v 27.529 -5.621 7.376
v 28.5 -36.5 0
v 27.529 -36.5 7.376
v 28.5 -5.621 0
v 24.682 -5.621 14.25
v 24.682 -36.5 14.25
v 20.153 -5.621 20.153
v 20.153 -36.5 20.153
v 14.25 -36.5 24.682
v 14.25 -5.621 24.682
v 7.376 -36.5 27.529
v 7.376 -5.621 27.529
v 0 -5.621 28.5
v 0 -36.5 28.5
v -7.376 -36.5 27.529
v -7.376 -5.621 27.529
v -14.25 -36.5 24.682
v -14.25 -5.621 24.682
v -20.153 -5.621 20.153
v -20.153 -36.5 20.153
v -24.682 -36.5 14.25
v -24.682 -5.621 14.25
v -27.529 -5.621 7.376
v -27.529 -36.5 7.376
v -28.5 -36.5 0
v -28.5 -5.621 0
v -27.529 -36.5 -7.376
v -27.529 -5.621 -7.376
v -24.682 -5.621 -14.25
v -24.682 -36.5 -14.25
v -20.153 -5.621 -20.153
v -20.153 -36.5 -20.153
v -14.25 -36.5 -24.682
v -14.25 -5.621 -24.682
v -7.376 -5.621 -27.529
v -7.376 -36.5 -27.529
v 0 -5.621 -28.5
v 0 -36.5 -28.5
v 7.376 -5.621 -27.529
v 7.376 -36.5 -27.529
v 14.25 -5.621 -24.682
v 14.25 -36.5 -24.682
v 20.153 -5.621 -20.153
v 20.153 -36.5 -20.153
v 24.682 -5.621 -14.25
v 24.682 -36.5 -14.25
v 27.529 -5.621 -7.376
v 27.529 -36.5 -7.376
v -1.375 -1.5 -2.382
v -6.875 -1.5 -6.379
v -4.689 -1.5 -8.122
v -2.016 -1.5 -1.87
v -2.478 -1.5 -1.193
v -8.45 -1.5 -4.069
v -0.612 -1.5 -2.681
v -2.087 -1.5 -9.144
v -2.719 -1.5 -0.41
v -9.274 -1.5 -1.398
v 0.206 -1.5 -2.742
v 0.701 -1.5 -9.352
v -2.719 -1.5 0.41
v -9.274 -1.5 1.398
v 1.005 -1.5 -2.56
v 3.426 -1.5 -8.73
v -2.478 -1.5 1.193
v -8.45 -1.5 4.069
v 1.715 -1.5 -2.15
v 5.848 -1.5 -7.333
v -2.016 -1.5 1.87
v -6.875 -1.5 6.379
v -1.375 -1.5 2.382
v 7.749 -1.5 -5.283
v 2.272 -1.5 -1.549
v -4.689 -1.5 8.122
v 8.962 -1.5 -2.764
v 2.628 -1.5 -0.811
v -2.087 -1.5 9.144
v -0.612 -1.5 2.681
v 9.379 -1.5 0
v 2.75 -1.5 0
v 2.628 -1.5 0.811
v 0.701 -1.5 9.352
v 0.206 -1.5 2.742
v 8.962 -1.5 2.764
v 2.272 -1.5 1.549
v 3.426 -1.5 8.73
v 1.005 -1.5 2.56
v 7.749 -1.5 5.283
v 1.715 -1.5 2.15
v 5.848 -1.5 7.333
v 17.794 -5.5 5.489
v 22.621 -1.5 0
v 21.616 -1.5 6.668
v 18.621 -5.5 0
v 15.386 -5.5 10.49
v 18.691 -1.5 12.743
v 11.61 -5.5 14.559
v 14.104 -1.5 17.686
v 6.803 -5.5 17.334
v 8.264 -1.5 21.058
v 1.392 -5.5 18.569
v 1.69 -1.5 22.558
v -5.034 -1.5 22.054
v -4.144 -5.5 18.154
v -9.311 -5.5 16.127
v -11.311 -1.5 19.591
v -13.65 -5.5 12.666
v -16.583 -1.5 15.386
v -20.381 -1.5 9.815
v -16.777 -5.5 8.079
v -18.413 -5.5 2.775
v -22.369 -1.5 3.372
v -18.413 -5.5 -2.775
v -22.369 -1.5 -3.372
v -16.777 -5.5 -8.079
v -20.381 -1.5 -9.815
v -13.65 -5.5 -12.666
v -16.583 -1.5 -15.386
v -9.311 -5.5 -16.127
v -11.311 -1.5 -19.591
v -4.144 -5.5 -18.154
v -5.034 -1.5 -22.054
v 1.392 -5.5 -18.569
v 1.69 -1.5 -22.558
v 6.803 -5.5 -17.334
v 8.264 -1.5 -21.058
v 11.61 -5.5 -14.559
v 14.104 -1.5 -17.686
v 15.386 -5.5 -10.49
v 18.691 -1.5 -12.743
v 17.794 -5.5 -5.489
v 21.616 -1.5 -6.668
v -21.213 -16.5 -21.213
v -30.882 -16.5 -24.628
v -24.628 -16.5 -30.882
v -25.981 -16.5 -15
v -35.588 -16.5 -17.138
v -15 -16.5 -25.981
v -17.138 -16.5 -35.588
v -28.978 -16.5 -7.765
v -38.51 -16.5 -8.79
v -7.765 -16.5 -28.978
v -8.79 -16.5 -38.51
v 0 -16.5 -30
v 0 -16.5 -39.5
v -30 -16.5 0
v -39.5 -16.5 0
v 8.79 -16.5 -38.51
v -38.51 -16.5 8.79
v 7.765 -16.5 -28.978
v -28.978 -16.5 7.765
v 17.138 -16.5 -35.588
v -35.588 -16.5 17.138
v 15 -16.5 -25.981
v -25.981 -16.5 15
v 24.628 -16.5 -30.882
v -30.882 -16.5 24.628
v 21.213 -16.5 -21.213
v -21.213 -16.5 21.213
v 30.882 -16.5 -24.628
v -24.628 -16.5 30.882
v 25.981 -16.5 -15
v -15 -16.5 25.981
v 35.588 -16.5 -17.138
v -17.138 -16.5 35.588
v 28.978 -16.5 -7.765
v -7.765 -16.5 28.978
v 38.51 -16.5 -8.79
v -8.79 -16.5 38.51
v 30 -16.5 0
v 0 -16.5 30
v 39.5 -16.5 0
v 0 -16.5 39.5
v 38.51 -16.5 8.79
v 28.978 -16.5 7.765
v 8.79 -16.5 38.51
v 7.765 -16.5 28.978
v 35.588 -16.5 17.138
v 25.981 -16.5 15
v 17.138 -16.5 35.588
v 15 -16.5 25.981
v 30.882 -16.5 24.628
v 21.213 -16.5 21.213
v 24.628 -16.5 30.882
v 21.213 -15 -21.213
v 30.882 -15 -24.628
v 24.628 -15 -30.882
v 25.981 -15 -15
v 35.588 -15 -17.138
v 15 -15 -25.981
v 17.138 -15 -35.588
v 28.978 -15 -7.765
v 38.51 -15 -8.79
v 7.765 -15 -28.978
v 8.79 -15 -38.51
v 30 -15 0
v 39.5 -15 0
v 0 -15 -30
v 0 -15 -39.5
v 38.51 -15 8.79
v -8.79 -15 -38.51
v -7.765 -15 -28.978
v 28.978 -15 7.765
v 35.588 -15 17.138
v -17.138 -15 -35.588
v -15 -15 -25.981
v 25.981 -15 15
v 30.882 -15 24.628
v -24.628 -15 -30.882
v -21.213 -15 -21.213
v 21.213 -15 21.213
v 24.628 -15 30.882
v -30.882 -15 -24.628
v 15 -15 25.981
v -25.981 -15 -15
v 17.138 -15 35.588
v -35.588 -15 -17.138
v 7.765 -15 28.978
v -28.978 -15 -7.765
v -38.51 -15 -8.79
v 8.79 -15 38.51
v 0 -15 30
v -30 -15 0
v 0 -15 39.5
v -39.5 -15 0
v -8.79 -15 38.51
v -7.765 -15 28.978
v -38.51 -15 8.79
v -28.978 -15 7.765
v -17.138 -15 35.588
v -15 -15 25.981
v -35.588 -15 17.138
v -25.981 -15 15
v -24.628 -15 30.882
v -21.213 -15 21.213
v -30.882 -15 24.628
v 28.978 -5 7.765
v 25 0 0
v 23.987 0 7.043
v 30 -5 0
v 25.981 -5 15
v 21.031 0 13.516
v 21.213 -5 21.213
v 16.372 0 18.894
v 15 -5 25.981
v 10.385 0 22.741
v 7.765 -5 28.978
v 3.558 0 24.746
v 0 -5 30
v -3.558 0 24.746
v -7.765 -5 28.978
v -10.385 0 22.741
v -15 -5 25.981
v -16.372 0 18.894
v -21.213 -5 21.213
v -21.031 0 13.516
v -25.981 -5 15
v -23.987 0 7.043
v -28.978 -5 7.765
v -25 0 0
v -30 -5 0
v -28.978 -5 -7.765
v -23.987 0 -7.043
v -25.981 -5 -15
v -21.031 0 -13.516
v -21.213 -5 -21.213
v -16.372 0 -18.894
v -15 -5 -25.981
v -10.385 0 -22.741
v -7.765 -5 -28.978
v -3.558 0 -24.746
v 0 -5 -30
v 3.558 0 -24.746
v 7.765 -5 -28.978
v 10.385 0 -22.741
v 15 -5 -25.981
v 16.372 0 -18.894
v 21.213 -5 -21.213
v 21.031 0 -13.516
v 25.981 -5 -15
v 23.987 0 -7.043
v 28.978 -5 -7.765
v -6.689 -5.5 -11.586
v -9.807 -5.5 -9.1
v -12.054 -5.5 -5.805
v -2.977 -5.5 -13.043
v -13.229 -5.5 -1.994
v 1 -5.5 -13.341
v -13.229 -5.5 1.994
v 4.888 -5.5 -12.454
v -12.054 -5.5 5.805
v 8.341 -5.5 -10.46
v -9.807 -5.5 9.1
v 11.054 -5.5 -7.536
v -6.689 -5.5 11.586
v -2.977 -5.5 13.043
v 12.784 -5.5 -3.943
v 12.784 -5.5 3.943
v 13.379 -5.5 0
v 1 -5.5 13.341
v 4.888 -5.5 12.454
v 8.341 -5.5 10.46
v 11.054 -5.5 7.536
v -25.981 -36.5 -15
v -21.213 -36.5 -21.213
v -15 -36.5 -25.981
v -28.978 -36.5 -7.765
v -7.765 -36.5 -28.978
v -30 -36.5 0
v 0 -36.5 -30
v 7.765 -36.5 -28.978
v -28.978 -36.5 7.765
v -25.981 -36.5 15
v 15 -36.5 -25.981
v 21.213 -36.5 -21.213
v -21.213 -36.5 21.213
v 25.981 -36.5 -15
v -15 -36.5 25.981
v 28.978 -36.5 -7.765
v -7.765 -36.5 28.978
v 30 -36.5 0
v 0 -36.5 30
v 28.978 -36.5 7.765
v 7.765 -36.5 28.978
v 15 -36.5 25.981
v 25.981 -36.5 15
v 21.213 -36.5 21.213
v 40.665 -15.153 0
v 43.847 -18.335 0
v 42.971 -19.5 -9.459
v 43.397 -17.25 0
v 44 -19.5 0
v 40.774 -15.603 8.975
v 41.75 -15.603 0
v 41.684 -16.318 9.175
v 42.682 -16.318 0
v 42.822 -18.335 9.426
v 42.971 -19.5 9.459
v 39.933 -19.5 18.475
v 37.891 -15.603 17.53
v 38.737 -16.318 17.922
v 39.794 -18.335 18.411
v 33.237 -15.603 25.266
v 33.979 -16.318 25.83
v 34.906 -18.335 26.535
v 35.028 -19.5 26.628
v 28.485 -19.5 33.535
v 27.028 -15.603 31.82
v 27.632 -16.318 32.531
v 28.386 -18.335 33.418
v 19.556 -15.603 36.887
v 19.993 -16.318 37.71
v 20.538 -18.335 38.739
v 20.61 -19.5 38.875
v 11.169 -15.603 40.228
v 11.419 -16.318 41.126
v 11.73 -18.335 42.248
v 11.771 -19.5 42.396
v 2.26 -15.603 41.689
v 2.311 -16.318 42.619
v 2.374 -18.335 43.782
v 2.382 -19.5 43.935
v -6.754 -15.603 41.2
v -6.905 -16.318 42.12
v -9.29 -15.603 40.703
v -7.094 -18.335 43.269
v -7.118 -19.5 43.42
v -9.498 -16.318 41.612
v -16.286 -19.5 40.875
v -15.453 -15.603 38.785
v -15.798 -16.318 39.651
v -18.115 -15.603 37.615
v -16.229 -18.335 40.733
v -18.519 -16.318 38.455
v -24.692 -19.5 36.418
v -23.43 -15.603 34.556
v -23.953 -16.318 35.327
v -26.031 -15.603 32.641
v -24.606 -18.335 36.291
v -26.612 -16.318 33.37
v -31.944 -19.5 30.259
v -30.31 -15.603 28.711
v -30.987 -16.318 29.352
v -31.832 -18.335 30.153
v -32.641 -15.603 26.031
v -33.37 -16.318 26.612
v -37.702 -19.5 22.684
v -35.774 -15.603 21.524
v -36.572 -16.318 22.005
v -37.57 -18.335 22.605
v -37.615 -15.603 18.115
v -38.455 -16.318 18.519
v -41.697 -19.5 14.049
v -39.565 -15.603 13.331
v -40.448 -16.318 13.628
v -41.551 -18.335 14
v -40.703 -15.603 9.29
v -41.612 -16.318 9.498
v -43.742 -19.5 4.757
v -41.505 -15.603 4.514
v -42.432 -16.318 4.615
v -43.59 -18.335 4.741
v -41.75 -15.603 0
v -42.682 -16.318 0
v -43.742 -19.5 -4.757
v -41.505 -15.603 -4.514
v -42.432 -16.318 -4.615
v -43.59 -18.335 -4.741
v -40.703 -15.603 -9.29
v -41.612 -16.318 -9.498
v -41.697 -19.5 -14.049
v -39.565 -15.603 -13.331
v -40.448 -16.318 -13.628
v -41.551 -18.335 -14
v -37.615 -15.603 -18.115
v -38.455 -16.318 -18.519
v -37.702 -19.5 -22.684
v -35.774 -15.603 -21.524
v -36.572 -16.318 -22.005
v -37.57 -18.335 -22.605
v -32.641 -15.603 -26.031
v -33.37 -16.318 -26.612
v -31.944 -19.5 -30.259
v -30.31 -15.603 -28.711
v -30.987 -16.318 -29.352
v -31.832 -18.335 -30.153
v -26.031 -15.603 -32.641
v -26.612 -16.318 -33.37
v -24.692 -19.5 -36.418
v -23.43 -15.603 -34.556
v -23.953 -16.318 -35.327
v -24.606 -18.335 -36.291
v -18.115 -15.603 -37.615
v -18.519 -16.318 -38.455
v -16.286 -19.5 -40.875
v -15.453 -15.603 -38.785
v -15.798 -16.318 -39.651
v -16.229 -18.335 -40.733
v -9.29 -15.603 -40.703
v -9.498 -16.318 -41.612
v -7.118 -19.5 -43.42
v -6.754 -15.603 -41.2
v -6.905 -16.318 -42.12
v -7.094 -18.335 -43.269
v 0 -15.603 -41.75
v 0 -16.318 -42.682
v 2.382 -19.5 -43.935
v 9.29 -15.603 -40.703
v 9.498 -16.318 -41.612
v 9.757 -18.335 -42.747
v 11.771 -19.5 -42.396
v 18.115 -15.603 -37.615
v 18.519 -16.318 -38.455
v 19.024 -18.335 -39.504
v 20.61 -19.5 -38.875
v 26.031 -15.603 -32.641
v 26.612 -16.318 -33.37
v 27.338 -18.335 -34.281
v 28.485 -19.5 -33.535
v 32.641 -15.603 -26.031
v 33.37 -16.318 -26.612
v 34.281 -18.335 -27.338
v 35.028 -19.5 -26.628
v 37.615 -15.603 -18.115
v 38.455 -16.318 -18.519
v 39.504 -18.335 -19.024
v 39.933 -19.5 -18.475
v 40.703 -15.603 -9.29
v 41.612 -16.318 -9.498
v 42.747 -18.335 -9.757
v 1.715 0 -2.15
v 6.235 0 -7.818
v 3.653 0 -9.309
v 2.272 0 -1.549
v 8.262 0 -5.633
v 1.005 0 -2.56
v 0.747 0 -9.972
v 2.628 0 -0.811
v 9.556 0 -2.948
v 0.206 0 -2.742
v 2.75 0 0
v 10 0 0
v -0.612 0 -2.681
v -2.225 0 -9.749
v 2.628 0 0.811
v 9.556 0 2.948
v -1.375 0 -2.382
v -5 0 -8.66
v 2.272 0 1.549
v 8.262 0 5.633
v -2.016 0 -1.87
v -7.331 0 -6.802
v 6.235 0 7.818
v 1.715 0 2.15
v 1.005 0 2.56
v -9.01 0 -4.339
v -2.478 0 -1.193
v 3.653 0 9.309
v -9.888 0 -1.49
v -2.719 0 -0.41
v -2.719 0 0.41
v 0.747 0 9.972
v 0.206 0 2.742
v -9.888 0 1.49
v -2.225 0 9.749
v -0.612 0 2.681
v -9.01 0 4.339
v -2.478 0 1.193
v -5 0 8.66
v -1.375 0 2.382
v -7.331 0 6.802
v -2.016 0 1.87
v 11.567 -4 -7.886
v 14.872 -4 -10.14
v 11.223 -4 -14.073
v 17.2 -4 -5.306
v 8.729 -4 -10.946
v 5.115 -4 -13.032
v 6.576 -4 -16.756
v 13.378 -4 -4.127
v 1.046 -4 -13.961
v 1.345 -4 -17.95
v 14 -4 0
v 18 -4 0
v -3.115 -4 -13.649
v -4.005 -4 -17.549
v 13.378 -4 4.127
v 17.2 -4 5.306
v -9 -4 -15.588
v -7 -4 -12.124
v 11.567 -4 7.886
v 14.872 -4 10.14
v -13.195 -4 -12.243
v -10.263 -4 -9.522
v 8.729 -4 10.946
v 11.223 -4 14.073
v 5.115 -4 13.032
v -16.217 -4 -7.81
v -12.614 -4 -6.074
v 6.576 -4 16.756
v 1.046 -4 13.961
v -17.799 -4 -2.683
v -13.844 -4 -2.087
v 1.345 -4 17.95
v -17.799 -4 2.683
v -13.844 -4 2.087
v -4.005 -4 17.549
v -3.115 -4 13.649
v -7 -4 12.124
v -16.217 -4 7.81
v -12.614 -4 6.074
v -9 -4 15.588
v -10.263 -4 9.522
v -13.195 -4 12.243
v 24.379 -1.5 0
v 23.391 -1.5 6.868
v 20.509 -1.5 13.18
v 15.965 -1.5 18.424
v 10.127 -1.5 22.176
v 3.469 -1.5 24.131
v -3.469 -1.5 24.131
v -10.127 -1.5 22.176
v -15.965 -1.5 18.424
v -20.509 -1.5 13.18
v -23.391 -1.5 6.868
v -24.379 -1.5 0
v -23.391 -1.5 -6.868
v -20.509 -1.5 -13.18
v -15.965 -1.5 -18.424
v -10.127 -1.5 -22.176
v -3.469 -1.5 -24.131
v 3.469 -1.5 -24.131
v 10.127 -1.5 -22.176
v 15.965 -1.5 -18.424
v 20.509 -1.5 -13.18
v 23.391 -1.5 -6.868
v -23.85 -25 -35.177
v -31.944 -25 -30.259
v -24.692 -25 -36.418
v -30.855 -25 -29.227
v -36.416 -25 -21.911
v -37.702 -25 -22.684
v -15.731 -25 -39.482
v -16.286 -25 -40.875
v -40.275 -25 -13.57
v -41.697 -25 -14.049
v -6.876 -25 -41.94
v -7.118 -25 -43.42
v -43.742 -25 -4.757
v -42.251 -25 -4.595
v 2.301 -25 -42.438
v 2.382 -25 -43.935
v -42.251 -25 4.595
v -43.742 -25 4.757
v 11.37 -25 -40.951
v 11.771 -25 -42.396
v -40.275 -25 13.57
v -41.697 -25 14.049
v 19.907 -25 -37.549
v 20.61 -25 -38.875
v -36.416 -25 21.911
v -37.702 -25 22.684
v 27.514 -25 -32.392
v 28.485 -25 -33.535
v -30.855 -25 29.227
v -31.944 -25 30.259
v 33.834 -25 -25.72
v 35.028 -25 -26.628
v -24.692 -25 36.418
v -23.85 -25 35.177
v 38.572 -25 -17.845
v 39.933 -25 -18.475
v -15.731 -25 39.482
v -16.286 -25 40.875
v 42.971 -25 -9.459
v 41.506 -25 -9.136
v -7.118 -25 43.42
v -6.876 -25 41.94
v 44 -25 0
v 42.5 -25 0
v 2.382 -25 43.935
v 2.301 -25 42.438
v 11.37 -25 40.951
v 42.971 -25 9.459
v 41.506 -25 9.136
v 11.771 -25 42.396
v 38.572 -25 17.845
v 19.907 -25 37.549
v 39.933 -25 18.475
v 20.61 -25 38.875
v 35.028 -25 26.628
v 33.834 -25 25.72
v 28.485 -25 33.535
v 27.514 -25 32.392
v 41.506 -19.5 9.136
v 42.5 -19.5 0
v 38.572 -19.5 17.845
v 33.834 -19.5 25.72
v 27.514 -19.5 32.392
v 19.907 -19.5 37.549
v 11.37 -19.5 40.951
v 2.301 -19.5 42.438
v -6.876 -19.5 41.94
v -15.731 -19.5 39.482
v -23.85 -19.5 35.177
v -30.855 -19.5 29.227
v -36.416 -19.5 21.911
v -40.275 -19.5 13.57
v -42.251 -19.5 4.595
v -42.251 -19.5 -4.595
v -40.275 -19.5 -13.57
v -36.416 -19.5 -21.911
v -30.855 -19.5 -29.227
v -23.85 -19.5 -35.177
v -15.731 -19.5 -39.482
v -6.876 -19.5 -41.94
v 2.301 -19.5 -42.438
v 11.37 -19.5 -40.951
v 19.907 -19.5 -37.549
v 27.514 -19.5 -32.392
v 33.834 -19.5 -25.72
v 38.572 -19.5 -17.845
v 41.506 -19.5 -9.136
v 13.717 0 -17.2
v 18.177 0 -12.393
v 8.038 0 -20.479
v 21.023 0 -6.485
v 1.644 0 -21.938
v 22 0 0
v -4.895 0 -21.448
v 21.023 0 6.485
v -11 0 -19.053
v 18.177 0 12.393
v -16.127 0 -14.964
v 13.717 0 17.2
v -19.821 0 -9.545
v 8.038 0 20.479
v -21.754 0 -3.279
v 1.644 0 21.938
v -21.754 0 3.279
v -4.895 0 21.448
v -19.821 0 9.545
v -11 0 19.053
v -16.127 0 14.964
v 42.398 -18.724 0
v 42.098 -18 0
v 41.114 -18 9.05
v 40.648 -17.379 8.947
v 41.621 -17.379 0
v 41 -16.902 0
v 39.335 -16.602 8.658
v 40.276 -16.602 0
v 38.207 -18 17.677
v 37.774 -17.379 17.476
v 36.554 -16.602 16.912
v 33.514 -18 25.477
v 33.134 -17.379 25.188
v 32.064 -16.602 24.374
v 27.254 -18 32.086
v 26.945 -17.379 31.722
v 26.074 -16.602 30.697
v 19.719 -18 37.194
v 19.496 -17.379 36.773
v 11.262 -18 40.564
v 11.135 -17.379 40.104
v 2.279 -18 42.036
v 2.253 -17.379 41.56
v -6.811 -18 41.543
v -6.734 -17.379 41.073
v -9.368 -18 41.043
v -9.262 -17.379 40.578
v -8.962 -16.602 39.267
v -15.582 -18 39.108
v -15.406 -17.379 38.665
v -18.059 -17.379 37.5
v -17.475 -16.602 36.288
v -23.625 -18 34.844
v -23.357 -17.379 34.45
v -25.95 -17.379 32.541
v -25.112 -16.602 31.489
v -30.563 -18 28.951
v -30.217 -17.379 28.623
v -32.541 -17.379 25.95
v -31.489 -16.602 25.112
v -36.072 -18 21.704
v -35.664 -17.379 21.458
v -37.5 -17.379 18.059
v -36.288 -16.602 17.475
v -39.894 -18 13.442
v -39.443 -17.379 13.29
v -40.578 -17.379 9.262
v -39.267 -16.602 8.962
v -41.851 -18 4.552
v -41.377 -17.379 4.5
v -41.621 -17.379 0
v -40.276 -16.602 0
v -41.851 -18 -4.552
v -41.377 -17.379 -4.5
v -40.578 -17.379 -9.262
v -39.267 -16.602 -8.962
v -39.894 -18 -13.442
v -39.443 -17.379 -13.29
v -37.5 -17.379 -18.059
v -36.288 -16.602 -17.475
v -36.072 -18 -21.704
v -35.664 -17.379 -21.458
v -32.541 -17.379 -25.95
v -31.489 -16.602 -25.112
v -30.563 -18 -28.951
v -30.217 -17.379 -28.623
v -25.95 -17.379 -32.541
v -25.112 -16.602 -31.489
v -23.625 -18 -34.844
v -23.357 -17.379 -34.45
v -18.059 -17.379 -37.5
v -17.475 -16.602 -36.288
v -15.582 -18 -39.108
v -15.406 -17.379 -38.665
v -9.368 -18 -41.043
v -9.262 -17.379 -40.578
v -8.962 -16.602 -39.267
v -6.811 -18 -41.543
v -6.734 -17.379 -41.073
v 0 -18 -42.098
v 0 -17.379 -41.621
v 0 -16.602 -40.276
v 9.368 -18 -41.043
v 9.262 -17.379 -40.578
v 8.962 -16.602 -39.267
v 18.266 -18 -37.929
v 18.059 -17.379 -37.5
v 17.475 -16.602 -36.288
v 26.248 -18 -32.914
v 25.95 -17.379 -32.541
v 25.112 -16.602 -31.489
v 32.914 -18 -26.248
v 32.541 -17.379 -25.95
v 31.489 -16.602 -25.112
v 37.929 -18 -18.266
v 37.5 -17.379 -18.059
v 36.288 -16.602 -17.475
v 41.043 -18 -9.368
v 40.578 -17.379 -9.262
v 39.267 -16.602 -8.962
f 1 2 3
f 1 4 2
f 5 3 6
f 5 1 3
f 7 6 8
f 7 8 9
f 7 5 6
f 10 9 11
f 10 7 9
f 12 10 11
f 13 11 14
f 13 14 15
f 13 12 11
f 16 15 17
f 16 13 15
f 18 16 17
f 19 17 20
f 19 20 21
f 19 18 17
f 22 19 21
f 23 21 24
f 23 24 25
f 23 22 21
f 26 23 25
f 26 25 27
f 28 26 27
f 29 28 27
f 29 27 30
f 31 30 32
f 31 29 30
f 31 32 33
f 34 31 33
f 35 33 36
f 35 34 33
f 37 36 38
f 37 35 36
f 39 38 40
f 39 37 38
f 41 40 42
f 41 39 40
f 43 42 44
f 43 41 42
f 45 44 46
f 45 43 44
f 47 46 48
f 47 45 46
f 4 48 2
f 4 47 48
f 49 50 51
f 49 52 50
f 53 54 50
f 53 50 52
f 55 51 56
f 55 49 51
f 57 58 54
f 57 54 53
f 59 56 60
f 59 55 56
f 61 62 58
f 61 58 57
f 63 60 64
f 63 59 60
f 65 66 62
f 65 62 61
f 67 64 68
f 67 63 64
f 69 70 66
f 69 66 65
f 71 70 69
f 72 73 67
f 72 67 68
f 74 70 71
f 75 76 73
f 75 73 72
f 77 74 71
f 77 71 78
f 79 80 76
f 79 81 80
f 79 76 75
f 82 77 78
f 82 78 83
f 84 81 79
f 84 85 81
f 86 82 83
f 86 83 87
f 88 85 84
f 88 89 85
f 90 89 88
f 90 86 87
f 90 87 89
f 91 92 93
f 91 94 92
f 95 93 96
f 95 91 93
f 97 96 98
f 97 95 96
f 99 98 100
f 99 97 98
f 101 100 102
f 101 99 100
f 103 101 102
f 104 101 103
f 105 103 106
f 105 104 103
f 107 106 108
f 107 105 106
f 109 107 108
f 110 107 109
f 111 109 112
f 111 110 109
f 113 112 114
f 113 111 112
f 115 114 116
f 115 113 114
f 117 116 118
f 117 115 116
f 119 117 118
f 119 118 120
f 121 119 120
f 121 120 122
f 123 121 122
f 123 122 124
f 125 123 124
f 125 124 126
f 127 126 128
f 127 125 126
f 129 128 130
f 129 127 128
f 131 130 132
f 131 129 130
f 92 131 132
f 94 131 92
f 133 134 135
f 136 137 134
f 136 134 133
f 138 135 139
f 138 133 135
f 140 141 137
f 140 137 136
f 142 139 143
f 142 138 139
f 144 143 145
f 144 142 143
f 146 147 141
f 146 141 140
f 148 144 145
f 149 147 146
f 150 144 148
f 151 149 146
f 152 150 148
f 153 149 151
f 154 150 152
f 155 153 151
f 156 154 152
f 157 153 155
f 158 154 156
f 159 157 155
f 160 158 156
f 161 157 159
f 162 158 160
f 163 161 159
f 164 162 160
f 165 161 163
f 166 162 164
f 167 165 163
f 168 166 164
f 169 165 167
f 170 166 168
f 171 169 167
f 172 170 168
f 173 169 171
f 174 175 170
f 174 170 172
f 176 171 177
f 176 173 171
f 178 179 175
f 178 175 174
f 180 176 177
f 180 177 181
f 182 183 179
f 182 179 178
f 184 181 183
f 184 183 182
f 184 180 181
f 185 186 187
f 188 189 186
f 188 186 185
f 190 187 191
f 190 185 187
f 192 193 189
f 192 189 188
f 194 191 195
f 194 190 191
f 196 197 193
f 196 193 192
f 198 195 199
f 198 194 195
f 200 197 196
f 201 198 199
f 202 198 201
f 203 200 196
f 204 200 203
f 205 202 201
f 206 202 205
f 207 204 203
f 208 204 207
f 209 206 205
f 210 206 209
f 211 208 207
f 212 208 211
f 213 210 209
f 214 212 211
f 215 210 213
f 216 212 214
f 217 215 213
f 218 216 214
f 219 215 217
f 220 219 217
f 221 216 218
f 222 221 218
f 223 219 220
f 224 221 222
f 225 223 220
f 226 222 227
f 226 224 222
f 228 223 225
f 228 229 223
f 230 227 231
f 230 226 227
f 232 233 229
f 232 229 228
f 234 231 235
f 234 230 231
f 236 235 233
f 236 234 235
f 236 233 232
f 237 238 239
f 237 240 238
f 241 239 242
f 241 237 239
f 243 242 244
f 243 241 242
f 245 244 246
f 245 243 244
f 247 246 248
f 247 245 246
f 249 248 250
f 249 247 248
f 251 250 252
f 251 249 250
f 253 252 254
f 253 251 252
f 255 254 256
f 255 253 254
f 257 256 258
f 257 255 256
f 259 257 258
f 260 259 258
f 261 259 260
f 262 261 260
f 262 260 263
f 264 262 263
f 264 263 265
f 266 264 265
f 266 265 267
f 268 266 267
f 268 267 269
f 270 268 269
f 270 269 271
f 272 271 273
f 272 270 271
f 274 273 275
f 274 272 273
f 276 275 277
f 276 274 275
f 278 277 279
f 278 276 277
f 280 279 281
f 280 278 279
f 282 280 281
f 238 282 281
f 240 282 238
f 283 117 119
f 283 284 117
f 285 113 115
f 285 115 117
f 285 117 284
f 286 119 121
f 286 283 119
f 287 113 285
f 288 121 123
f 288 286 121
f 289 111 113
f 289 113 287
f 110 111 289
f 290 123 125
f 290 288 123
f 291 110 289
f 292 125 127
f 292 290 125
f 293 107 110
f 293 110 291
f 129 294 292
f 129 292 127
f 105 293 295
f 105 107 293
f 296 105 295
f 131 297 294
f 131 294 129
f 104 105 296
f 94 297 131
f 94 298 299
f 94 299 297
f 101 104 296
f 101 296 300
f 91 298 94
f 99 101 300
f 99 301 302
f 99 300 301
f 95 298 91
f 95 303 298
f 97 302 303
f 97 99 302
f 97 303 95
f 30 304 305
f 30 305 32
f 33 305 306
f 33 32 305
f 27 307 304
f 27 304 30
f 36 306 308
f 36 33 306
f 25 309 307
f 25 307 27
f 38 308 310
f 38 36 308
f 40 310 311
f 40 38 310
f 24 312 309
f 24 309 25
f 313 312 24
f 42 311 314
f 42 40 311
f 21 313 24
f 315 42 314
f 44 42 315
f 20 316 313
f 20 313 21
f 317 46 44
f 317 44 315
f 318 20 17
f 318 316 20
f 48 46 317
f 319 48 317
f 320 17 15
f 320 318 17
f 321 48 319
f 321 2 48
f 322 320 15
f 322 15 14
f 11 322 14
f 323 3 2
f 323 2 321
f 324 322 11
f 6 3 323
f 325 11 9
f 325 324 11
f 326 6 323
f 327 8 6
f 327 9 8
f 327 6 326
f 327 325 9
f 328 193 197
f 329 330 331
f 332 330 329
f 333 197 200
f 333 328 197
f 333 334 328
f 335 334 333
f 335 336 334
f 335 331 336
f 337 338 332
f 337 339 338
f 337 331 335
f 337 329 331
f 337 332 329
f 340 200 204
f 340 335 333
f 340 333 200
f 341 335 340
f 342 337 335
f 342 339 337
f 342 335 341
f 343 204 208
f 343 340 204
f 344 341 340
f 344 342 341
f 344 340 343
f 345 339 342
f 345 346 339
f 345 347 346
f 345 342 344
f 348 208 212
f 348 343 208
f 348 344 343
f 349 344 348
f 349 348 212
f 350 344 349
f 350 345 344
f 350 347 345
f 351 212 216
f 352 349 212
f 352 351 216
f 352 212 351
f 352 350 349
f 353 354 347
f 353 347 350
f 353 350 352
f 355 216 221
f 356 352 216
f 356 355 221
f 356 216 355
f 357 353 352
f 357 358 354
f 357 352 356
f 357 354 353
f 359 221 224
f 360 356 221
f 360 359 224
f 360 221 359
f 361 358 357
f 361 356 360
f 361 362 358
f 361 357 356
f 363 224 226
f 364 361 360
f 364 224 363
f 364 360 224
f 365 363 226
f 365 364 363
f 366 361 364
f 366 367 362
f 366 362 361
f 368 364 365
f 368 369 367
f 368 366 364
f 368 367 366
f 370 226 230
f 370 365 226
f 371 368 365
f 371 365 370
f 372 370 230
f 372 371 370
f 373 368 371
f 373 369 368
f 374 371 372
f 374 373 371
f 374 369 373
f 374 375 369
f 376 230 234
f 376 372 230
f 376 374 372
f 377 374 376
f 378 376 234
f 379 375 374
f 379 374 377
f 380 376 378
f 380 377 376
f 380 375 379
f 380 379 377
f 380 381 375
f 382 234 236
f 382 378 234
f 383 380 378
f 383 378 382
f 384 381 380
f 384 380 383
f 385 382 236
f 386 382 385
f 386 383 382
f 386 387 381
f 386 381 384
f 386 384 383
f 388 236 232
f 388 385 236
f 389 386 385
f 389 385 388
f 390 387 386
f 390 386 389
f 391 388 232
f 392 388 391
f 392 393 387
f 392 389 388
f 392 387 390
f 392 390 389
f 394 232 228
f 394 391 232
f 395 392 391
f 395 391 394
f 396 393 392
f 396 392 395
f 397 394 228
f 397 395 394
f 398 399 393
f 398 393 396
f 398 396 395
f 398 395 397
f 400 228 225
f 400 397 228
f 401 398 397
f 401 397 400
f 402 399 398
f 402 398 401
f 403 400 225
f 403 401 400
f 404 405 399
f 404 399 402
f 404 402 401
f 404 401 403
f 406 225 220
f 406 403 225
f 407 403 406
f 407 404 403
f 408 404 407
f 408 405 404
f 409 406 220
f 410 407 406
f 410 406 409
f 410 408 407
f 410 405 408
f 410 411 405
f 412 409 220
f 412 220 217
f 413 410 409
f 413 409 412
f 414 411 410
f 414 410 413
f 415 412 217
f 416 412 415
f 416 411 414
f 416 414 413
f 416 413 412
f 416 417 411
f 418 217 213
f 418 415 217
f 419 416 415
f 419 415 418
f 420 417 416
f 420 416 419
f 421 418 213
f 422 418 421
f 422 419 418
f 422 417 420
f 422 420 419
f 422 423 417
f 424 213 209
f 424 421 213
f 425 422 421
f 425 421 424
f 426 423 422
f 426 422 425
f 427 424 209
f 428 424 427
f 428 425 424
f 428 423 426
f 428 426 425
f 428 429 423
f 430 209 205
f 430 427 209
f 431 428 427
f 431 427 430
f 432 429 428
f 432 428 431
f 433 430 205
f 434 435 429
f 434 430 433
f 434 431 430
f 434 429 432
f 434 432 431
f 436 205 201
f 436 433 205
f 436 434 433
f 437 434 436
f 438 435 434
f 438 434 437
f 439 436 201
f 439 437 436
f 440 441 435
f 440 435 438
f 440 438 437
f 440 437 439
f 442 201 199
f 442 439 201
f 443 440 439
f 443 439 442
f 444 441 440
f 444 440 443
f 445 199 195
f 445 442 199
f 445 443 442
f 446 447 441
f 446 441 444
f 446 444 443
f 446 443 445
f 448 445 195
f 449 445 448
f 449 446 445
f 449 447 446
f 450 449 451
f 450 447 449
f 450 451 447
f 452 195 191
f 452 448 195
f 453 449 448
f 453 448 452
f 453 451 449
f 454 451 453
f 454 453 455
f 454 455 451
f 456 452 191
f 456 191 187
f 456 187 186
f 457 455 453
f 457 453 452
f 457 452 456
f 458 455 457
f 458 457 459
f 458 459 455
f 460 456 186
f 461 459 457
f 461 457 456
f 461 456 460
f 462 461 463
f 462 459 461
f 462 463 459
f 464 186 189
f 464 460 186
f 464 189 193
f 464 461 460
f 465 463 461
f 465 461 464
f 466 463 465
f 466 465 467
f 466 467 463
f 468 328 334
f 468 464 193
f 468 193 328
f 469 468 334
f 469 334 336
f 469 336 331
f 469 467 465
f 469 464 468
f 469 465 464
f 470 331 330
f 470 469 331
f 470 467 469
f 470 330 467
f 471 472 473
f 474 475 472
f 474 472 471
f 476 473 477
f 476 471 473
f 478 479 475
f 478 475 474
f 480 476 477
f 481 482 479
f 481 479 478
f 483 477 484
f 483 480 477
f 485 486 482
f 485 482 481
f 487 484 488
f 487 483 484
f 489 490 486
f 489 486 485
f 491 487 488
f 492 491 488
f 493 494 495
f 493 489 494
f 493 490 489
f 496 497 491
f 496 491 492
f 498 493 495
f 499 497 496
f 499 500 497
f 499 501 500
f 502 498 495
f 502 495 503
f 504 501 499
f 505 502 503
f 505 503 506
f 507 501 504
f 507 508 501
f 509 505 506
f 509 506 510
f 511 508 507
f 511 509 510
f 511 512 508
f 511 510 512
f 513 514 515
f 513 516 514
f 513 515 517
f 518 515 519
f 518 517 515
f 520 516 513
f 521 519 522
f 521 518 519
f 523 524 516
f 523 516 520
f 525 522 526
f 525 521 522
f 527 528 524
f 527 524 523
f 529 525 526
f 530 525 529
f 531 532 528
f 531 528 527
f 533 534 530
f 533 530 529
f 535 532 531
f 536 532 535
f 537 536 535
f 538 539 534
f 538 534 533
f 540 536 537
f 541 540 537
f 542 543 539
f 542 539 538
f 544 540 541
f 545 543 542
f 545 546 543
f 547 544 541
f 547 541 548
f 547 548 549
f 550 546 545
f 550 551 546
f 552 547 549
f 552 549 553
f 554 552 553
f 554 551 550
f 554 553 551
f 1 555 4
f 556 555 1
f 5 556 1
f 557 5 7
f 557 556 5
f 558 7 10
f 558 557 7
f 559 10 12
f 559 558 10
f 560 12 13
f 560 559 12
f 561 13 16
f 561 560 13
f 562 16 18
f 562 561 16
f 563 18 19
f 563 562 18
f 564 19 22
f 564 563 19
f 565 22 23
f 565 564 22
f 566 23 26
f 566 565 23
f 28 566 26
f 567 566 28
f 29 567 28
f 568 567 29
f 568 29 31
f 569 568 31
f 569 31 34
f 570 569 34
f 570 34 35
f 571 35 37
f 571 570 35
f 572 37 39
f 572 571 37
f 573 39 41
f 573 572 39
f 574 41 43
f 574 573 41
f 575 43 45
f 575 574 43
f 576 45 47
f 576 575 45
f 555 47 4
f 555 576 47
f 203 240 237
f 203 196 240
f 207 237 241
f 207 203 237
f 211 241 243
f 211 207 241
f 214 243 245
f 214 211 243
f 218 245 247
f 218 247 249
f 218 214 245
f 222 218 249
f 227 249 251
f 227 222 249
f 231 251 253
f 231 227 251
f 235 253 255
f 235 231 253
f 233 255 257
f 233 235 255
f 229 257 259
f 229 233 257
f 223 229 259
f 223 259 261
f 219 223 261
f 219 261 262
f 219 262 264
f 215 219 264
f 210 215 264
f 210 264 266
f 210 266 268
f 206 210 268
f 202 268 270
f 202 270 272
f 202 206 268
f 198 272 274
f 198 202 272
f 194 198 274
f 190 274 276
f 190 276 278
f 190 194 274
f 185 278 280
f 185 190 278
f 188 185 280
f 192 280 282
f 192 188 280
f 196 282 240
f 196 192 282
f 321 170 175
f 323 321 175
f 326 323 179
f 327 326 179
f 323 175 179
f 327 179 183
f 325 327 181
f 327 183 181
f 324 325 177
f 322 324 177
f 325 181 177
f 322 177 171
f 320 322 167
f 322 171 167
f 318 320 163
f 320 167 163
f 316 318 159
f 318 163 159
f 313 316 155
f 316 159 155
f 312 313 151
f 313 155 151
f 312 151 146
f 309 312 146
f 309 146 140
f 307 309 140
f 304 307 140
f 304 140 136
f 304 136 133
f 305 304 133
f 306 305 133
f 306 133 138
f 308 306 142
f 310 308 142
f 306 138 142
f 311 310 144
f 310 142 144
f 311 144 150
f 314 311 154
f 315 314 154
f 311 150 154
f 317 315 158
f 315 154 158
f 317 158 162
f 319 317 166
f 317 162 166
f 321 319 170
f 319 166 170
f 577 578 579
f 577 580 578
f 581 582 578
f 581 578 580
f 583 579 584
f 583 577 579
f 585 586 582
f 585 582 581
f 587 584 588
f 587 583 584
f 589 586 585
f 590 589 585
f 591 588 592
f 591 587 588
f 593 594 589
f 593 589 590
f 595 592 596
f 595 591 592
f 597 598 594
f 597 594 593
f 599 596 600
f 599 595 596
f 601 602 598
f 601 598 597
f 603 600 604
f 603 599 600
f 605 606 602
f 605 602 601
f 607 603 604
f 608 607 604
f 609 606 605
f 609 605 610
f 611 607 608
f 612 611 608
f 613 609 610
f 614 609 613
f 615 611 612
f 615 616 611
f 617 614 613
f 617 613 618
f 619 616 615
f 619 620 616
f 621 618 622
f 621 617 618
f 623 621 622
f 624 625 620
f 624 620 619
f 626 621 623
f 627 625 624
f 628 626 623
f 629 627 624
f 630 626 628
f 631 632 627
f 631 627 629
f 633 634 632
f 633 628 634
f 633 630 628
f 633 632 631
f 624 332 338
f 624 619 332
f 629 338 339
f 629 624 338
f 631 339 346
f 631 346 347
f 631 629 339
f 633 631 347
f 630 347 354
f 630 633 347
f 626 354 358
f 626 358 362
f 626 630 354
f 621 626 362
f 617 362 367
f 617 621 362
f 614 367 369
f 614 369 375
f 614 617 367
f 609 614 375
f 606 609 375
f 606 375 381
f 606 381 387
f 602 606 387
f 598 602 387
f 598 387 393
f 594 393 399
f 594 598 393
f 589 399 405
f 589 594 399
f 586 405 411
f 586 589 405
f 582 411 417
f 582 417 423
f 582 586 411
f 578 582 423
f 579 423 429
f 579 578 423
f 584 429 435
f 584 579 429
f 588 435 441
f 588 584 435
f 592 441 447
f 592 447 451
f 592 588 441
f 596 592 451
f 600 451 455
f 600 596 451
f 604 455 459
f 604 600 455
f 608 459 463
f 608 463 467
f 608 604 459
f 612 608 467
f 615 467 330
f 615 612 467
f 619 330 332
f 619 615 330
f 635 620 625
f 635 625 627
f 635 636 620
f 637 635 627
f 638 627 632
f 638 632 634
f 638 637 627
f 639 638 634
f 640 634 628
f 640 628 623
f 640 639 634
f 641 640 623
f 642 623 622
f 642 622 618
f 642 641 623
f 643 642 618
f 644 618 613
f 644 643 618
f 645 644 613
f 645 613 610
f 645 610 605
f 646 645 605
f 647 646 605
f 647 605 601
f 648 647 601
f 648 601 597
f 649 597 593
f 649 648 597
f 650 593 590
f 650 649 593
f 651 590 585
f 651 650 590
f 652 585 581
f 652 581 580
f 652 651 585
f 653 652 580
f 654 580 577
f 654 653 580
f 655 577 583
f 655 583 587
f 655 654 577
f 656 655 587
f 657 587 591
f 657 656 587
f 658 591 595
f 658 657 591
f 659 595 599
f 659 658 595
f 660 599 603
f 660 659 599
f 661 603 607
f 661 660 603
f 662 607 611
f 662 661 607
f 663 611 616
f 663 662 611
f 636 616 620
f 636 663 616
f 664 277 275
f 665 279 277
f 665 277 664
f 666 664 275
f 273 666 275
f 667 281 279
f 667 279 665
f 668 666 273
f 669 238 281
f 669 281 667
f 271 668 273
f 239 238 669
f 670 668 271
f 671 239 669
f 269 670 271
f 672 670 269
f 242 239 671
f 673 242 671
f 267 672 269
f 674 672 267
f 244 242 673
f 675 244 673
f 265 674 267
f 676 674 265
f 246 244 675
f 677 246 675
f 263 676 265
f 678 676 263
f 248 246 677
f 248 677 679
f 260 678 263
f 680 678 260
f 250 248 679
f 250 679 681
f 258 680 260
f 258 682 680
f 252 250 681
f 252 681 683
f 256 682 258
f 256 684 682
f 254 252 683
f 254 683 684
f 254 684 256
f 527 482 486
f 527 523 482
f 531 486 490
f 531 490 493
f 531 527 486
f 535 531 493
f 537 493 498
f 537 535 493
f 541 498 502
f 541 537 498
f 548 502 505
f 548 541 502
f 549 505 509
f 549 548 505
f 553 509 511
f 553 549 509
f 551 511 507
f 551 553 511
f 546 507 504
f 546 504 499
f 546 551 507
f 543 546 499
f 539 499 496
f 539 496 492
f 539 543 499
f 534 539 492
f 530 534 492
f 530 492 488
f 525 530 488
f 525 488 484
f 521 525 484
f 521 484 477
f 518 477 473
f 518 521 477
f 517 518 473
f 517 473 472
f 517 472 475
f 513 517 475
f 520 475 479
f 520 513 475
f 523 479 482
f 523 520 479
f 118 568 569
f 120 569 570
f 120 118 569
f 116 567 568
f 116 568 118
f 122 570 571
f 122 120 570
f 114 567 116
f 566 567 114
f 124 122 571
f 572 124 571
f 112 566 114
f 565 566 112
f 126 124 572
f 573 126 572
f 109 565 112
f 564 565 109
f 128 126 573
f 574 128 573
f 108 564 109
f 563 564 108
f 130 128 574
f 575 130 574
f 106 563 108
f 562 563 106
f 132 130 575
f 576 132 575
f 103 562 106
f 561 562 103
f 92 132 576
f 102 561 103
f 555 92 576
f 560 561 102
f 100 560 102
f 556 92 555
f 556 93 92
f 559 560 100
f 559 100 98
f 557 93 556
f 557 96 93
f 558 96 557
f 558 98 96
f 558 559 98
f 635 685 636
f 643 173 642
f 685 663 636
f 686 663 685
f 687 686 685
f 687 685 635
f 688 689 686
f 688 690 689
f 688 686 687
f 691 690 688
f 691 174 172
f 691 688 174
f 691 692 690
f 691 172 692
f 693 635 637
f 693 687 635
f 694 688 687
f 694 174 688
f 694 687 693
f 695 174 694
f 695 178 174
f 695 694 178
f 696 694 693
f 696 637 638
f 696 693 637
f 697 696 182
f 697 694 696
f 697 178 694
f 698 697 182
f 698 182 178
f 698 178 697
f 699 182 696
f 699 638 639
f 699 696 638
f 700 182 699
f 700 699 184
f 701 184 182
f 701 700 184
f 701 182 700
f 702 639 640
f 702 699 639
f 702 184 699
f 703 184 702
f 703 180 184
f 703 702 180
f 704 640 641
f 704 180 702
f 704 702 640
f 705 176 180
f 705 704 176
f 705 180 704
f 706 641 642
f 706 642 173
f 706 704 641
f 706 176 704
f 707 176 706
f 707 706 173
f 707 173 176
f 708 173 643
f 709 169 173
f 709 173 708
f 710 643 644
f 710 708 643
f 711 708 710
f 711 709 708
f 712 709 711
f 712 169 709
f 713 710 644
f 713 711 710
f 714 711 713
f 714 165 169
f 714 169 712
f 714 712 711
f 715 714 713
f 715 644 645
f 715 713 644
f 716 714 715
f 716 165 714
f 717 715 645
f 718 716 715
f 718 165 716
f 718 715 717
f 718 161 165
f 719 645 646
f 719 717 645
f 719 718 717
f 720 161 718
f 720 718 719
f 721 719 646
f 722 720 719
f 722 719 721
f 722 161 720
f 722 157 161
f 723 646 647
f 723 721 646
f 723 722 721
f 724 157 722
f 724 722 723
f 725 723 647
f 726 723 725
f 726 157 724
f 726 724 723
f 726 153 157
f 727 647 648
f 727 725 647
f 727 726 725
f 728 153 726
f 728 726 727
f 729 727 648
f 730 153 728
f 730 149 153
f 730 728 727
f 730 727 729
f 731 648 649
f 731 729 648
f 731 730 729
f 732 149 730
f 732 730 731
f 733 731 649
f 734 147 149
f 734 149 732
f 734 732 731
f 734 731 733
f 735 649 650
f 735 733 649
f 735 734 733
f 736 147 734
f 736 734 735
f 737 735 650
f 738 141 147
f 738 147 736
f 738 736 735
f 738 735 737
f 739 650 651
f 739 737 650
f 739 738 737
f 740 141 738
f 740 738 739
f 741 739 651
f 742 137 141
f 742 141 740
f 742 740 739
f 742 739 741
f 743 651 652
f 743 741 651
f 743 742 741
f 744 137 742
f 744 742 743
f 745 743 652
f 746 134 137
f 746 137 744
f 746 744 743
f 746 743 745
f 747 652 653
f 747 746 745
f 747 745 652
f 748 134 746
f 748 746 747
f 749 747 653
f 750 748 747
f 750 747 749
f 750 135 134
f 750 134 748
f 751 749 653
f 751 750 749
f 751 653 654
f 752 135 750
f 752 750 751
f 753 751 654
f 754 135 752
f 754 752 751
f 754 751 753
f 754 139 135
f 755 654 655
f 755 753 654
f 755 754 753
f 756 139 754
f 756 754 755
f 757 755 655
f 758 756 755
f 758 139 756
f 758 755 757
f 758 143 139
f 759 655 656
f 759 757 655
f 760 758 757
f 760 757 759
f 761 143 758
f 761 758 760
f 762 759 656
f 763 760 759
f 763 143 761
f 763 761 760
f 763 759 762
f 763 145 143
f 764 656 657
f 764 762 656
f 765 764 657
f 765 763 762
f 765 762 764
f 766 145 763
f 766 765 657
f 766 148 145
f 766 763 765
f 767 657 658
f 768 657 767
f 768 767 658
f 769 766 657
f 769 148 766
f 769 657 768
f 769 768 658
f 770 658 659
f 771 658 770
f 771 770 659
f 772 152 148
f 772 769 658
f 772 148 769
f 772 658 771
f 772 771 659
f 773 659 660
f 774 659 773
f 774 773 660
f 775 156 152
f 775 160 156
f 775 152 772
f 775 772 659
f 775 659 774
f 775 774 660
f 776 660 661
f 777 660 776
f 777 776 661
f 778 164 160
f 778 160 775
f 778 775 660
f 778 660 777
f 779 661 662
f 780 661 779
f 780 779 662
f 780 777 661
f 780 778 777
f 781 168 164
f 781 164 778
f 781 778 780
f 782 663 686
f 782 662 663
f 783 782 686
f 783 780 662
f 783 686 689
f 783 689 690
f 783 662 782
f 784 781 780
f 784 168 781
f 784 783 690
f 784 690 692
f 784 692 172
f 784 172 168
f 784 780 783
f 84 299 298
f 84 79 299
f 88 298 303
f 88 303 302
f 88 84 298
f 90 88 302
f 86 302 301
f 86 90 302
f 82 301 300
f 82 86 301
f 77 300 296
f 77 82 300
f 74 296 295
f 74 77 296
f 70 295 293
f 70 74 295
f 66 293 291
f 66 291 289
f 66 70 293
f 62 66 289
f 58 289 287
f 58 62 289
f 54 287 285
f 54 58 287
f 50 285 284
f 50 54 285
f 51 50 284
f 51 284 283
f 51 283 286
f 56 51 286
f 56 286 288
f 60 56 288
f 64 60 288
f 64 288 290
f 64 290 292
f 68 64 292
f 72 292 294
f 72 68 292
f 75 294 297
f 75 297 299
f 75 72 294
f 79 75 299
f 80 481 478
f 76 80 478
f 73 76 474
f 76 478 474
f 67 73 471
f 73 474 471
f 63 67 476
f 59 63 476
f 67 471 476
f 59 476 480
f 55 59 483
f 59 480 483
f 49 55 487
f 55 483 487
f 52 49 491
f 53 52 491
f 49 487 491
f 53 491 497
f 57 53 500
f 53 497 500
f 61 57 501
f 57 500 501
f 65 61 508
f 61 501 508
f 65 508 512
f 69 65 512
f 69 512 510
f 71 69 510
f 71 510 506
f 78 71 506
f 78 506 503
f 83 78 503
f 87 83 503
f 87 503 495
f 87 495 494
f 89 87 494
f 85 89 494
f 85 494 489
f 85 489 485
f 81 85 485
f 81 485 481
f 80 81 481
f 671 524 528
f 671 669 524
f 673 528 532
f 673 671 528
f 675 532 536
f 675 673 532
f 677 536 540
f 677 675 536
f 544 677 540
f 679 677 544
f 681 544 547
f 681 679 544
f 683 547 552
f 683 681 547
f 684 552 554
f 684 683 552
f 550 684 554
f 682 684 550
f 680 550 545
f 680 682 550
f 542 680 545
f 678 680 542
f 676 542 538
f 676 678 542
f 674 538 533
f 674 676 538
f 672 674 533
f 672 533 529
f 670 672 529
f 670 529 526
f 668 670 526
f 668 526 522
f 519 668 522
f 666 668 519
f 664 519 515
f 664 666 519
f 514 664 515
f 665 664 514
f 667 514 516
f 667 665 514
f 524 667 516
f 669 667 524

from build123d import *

# Parameters (mm, degrees)
SKETCH_2_R          = 2.75
CUT_EXTRUDE_1_DEPTH = 26
SKETCH_3_R          = 30
SKETCH_3_R_2        = 28.5
EXTRUDE_1_DEPTH     = 20


with BuildPart() as part:
    # Эскиз1 → Повернуть2 (revolve)
    with BuildSketch(Plane.XY):
        with BuildLine():
            Line((0, 0), (10, 0))
            Line((10, 0), (14, -4))
            Line((14, -4), (18, -4))
            Line((18, -4), (22, 0))
            Line((22, 0), (25, 0))
            Line((25, 0), (30, -5))
            Line((30, -5), (30, -15))
            Line((30, -15), (39.5, -15))
            ThreePointArc((39.5, -15), (42.681980515, -16.318019485), (44, -19.5))
            Line((44, -19.5), (44, -25))
            Line((44, -25), (42.5, -25))
            Line((42.5, -25), (42.5, -19.5))
            ThreePointArc((42.5, -19.5), (41.621320344, -17.378679656), (39.5, -16.5))
            Line((39.5, -16.5), (28.5, -16.5))
            Line((28.5, -16.5), (28.5, -5.621320344))
            Line((28.5, -5.621320344), (24.378679656, -1.5))
            Line((24.378679656, -1.5), (22.621320344, -1.5))
            Line((22.621320344, -1.5), (18.621320344, -5.5))
            Line((18.621320344, -5.5), (13.378679656, -5.5))
            Line((13.378679656, -5.5), (9.378679656, -1.5))
            Line((9.378679656, -1.5), (0, -1.5))
            Line((0, -1.5), (0, 0))
        make_face()
    revolve(axis=Axis((0, 0, 0), (0, -1, 0)))

    # Эскиз2 → Вырез-Вытянуть1 (cut, through all)
    with BuildSketch(Plane(origin=(0, 0, 0), x_dir=(1, 0, 0), z_dir=(0, 1, 0))):
        Circle(SKETCH_2_R)
    extrude(amount=-CUT_EXTRUDE_1_DEPTH, mode=Mode.SUBTRACT)

    # Эскиз3 → Бобышка-Вытянуть1 (add)
    with BuildSketch(Plane.XZ.offset(16.5)):
        Circle(SKETCH_3_R)
        Circle(SKETCH_3_R_2, mode=Mode.SUBTRACT)
    extrude(amount=EXTRUDE_1_DEPTH)


solid = part.part
